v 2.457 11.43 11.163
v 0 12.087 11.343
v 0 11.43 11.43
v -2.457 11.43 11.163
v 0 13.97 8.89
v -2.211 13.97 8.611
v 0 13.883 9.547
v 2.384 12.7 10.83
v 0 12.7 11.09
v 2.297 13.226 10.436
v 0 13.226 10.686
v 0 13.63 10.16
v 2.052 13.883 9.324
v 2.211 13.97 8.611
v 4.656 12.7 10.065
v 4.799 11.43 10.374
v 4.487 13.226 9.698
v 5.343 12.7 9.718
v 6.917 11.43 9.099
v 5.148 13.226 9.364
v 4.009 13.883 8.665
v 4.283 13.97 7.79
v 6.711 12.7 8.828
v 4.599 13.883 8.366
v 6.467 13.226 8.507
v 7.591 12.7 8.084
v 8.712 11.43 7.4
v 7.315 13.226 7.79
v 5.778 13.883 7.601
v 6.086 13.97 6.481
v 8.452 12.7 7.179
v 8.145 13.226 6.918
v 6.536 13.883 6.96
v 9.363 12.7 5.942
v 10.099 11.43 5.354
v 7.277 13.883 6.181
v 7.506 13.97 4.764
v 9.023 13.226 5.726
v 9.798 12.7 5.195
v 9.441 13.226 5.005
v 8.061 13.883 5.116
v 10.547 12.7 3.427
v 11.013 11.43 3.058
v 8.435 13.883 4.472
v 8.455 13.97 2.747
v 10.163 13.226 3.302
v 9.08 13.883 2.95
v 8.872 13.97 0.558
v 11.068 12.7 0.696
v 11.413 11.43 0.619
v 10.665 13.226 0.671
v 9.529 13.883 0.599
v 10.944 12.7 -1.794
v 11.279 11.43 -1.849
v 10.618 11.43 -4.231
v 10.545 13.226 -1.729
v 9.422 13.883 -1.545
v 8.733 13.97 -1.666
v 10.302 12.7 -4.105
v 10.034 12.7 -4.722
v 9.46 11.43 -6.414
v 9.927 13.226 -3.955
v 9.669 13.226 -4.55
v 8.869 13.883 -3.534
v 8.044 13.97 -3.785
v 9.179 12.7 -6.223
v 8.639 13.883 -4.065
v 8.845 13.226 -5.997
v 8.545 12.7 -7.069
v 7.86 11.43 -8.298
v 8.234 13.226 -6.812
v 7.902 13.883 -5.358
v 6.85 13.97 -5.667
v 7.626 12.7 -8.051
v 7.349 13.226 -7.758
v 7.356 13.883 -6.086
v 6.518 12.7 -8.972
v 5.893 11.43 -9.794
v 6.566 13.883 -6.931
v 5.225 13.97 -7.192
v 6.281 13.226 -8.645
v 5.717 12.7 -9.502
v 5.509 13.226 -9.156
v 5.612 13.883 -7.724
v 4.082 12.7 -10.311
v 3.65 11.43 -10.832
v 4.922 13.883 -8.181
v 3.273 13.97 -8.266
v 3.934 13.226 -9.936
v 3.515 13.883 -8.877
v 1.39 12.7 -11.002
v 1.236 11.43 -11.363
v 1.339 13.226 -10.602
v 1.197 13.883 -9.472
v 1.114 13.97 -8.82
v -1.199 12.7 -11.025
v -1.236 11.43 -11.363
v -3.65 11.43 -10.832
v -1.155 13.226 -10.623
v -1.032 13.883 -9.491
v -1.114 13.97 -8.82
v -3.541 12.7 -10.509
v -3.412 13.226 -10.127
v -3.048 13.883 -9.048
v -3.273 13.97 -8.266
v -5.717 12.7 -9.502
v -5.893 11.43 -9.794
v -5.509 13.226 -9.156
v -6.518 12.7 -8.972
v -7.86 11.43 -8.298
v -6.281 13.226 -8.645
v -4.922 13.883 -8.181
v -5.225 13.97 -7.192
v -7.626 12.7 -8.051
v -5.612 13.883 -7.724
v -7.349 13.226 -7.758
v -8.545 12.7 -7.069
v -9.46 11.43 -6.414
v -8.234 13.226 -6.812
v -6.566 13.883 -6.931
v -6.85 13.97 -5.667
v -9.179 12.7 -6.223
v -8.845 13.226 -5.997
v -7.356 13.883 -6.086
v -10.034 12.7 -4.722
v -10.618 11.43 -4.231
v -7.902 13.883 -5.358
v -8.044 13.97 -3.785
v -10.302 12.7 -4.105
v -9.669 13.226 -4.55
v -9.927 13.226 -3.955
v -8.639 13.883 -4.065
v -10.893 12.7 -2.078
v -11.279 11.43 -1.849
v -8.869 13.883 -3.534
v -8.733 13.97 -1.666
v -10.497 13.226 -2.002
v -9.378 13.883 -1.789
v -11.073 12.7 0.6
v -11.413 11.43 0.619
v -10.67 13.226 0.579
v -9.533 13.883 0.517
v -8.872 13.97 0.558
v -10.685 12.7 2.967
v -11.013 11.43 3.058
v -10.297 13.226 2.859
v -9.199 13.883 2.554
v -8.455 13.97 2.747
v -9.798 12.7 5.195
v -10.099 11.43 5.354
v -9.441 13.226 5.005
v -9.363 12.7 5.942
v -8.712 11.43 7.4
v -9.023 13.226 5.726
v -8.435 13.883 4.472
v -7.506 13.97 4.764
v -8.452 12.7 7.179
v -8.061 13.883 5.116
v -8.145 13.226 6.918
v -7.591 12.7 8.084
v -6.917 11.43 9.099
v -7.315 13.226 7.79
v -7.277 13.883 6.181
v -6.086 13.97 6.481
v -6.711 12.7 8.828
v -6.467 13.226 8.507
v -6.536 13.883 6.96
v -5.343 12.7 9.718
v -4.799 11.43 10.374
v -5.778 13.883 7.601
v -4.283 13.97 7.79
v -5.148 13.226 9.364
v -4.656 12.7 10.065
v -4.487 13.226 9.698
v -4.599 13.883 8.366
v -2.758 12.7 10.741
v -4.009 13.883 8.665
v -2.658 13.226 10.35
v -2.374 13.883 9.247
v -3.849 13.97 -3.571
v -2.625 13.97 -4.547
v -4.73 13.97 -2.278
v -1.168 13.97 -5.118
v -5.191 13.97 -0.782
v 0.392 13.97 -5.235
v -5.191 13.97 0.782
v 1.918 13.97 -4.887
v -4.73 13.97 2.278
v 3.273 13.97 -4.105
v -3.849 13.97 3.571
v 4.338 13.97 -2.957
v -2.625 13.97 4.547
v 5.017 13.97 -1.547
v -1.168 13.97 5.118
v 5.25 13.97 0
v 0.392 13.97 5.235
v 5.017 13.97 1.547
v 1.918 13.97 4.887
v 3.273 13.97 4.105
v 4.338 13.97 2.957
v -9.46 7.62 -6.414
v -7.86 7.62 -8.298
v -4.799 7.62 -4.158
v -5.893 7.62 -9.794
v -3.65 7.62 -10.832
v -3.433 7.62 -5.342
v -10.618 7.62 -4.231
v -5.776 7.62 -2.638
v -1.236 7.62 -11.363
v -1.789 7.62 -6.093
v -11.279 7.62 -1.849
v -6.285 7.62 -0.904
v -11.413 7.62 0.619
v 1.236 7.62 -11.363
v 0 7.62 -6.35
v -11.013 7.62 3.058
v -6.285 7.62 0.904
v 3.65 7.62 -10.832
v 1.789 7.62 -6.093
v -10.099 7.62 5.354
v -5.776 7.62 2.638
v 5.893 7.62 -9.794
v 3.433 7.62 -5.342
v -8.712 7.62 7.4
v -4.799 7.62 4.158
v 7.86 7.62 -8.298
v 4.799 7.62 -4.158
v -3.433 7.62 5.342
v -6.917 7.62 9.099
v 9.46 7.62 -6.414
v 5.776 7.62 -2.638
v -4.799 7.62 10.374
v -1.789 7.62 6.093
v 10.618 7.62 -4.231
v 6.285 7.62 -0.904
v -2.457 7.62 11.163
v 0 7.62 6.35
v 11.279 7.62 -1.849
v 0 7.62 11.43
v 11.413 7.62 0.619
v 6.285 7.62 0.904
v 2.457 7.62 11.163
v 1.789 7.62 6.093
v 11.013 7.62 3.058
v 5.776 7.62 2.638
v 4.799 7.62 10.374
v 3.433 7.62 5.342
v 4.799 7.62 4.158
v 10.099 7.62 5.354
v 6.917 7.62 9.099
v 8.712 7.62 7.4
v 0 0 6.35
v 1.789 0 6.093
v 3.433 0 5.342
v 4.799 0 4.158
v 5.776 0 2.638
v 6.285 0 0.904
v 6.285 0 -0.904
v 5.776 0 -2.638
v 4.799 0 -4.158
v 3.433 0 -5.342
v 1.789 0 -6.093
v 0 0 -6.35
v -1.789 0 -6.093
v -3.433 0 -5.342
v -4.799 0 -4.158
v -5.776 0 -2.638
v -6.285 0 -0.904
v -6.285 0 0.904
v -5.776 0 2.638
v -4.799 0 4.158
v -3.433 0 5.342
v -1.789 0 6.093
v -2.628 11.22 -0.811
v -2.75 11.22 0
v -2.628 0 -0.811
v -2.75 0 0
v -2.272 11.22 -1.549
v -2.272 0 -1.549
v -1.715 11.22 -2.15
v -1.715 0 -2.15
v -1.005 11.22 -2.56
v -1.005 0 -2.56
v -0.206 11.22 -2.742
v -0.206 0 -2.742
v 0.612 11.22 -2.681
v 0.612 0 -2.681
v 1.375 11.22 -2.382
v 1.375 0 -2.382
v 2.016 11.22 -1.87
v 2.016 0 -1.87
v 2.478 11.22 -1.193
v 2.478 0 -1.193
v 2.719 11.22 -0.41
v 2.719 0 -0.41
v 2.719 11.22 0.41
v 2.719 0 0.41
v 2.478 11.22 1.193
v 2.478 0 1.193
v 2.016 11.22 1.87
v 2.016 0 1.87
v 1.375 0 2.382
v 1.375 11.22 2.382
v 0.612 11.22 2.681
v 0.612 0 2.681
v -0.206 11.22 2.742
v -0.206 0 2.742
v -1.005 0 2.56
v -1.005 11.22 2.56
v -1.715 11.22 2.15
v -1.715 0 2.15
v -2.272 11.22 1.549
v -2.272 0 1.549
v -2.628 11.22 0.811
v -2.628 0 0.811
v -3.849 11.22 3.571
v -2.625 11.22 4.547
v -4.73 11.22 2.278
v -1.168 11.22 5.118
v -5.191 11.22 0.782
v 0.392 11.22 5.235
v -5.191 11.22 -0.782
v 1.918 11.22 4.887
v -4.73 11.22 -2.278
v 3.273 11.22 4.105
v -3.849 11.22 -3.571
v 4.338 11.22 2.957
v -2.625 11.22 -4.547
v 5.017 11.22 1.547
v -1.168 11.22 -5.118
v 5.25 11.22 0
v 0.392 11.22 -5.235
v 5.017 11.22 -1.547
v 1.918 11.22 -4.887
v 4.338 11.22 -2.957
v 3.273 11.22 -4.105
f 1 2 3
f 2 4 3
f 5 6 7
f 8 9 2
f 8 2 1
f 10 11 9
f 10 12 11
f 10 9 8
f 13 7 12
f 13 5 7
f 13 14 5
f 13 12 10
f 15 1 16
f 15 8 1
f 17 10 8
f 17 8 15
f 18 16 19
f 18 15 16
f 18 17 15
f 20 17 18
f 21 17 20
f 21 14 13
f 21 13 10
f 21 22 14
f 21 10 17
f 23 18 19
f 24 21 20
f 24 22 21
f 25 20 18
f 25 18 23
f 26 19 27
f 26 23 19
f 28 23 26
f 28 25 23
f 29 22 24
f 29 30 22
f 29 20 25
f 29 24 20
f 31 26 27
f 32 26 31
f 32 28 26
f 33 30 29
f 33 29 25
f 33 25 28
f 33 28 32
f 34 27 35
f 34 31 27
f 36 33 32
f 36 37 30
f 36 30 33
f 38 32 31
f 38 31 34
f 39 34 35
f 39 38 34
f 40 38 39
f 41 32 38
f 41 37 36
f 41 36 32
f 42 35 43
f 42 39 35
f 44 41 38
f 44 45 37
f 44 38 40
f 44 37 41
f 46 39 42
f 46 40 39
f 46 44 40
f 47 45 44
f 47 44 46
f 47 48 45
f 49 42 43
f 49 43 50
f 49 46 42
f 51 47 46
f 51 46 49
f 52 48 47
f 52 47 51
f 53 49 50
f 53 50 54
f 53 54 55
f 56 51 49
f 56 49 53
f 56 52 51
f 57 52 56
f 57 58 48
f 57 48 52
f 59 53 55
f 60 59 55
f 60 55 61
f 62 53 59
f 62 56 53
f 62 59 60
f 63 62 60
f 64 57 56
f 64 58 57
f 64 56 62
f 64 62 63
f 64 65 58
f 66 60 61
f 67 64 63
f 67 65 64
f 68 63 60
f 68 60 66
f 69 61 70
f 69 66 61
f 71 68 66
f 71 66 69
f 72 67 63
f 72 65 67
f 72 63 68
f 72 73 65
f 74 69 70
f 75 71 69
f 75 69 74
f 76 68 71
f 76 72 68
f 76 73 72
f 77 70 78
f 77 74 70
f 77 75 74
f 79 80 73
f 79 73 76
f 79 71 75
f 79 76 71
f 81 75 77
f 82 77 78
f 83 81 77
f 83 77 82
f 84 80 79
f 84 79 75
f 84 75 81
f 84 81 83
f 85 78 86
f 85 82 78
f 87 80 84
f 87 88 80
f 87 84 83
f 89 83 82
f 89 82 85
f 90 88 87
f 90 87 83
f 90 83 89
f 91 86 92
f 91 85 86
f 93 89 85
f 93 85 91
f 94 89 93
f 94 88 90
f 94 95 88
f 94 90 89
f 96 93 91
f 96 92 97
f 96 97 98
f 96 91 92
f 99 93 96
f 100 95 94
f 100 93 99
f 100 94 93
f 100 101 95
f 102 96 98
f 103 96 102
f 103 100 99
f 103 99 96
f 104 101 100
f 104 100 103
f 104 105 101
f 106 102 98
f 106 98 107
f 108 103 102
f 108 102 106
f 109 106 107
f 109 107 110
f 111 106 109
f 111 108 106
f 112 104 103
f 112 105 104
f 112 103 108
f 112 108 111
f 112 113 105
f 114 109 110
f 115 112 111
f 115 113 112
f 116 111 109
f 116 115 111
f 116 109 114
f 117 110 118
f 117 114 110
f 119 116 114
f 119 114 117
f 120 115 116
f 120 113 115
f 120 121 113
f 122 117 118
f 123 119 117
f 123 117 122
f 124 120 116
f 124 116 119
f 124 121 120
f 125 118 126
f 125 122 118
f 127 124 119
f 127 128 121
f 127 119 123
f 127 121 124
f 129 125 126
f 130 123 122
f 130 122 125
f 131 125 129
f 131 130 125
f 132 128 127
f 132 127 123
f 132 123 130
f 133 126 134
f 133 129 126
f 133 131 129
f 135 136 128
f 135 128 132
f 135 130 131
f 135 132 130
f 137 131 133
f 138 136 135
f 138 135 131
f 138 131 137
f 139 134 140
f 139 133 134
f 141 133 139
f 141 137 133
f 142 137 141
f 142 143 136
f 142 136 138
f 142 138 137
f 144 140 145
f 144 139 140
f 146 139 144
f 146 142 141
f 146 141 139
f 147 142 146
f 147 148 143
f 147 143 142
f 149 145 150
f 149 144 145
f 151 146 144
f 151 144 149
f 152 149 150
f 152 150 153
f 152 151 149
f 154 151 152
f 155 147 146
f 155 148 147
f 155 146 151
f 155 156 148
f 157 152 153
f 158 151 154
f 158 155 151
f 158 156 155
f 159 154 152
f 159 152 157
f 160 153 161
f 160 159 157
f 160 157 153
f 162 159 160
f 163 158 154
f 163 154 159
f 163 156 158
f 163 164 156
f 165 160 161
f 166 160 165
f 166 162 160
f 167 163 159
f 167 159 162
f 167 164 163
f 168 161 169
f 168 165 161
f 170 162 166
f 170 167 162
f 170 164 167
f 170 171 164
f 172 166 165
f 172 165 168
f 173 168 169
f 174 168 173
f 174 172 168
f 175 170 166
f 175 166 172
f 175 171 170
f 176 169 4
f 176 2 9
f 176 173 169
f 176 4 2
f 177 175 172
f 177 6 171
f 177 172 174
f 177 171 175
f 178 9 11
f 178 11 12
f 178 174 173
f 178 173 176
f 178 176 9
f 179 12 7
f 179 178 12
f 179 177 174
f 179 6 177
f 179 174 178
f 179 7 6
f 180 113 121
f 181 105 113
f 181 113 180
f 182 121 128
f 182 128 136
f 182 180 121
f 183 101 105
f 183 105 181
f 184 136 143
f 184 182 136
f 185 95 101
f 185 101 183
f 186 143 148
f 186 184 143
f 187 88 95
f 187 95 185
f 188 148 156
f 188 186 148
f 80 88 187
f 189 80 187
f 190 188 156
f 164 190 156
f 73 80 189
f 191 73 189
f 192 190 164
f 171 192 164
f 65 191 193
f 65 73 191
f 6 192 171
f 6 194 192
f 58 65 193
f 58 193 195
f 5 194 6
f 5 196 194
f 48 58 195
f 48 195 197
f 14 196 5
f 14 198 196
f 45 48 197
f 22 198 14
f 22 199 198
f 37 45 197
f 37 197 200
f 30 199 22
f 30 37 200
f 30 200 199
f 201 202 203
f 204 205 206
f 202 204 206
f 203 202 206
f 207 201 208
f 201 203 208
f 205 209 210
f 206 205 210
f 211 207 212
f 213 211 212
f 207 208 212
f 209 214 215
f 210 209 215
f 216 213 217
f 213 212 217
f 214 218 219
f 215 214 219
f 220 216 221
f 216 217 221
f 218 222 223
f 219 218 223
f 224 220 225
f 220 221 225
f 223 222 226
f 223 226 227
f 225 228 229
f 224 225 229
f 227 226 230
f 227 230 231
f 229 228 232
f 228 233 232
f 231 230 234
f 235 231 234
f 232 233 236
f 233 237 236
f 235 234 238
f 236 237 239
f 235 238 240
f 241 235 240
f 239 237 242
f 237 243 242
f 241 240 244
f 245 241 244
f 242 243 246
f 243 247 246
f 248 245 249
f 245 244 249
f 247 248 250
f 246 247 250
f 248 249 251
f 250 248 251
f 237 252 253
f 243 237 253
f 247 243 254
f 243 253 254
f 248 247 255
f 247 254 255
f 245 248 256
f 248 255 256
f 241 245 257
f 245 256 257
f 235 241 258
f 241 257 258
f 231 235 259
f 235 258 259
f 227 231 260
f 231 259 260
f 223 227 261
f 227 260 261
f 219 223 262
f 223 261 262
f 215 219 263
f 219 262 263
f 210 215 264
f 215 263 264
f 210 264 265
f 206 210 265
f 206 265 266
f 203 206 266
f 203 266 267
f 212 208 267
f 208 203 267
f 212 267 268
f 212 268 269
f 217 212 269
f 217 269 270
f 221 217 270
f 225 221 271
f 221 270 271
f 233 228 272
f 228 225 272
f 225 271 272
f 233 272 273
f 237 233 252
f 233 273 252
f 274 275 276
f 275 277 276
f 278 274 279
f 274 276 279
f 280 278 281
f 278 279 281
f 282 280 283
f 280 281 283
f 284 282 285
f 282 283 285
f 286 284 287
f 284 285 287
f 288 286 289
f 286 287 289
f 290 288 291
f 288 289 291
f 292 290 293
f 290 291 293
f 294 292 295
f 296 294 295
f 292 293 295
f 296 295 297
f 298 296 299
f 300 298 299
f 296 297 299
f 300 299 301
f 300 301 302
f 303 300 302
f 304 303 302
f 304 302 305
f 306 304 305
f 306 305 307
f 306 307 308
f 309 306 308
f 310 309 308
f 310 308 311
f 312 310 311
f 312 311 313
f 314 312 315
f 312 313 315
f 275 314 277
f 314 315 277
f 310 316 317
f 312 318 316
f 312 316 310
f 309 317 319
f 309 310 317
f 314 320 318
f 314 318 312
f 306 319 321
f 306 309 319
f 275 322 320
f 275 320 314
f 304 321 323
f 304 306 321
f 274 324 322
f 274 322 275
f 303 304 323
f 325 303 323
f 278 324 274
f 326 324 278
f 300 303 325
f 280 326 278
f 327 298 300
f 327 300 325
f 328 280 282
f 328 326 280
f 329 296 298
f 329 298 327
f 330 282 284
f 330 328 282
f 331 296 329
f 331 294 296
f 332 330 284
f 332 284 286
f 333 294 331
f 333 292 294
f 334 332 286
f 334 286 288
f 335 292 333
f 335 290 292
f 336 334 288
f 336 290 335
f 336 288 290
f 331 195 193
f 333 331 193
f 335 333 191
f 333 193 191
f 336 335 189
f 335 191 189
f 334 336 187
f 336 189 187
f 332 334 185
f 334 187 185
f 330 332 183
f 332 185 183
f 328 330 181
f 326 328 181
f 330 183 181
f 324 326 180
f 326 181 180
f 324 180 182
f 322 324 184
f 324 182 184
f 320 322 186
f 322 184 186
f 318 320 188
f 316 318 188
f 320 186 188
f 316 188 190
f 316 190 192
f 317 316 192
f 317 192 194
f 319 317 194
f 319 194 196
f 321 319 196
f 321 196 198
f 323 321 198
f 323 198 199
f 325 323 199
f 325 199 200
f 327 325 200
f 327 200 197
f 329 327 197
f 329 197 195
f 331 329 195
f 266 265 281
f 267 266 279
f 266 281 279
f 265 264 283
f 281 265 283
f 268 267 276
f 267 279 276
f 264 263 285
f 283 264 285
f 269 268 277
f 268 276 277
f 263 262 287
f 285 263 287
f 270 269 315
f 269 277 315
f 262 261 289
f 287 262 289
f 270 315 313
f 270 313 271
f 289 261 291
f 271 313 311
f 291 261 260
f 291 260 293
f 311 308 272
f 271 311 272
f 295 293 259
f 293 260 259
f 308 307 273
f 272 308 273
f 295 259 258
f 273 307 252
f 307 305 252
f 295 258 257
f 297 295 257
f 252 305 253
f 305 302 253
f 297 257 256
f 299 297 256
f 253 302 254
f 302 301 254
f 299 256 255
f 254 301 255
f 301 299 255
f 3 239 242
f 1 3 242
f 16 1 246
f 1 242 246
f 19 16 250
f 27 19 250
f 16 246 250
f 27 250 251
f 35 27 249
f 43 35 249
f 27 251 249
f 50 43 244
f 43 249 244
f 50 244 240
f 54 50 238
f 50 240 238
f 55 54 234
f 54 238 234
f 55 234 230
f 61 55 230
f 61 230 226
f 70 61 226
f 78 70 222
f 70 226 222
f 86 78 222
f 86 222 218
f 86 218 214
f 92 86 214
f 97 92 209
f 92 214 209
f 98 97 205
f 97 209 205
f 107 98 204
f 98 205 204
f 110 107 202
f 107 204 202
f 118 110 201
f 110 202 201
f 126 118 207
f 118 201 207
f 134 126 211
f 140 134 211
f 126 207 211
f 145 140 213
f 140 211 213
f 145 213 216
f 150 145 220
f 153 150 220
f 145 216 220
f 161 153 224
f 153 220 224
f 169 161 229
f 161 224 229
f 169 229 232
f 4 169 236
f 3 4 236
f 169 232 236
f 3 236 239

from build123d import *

# Parameters (mm, degrees)
SKETCH1_R                       = 6.35
BOSS_EXTRUDE1_DEPTH             = 8.89
BOSS_EXTRUDE2_DEPTH             = 5.08
BOSS_EXTRUDE2_DEPTH_BACK        = 1.27
SKETCH2_R                       = 11.43
CBORE_FOR_M5_SBHCS1_D           = 5.5
CBORE_FOR_M5_SBHCS1_CBORE_D     = 10.5
CBORE_FOR_M5_SBHCS1_CBORE_DEPTH = 2.75
FILLET1_R                       = 2.54


with BuildPart() as part:
    # Sketch1 → Boss-Extrude1 (new body)
    with BuildSketch(Plane(origin=(0, 0, 0), x_dir=(1, 0, 0), z_dir=(0, 1, 0))):
        with Locations(Location((0, 0, 0), (0, 0, 270))):
            Circle(SKETCH1_R)
    extrude(amount=BOSS_EXTRUDE1_DEPTH)

    # Sketch2 → Boss-Extrude2 (add, two sides: drawn at the far end of the back side and taken through both)
    with BuildSketch(Plane(origin=(0, 8.89, 0), x_dir=(1, 0, 0), z_dir=(0, 1, 0)).offset(-BOSS_EXTRUDE2_DEPTH_BACK)):
        with Locations(Location((0, 0, 0), (0, 0, 270))):
            Circle(SKETCH2_R)
    extrude(amount=BOSS_EXTRUDE2_DEPTH + BOSS_EXTRUDE2_DEPTH_BACK)

    # CBORE for M5 SBHCS1 (through all)
    with Locations(Plane(origin=(0, 13.97, 0), x_dir=(1, 0, 0), z_dir=(0, 1, 0))):
        with Locations((0, 0)):
            CounterBoreHole(CBORE_FOR_M5_SBHCS1_D / 2, CBORE_FOR_M5_SBHCS1_CBORE_D / 2, CBORE_FOR_M5_SBHCS1_CBORE_DEPTH)

    # Fillet1
    fillet1_edges = [part.edges().sort_by_distance(p)[0] for p in [
        (0, 13.97, -11.43),
    ]]
    fillet(fillet1_edges, radius=FILLET1_R)


solid = part.part
